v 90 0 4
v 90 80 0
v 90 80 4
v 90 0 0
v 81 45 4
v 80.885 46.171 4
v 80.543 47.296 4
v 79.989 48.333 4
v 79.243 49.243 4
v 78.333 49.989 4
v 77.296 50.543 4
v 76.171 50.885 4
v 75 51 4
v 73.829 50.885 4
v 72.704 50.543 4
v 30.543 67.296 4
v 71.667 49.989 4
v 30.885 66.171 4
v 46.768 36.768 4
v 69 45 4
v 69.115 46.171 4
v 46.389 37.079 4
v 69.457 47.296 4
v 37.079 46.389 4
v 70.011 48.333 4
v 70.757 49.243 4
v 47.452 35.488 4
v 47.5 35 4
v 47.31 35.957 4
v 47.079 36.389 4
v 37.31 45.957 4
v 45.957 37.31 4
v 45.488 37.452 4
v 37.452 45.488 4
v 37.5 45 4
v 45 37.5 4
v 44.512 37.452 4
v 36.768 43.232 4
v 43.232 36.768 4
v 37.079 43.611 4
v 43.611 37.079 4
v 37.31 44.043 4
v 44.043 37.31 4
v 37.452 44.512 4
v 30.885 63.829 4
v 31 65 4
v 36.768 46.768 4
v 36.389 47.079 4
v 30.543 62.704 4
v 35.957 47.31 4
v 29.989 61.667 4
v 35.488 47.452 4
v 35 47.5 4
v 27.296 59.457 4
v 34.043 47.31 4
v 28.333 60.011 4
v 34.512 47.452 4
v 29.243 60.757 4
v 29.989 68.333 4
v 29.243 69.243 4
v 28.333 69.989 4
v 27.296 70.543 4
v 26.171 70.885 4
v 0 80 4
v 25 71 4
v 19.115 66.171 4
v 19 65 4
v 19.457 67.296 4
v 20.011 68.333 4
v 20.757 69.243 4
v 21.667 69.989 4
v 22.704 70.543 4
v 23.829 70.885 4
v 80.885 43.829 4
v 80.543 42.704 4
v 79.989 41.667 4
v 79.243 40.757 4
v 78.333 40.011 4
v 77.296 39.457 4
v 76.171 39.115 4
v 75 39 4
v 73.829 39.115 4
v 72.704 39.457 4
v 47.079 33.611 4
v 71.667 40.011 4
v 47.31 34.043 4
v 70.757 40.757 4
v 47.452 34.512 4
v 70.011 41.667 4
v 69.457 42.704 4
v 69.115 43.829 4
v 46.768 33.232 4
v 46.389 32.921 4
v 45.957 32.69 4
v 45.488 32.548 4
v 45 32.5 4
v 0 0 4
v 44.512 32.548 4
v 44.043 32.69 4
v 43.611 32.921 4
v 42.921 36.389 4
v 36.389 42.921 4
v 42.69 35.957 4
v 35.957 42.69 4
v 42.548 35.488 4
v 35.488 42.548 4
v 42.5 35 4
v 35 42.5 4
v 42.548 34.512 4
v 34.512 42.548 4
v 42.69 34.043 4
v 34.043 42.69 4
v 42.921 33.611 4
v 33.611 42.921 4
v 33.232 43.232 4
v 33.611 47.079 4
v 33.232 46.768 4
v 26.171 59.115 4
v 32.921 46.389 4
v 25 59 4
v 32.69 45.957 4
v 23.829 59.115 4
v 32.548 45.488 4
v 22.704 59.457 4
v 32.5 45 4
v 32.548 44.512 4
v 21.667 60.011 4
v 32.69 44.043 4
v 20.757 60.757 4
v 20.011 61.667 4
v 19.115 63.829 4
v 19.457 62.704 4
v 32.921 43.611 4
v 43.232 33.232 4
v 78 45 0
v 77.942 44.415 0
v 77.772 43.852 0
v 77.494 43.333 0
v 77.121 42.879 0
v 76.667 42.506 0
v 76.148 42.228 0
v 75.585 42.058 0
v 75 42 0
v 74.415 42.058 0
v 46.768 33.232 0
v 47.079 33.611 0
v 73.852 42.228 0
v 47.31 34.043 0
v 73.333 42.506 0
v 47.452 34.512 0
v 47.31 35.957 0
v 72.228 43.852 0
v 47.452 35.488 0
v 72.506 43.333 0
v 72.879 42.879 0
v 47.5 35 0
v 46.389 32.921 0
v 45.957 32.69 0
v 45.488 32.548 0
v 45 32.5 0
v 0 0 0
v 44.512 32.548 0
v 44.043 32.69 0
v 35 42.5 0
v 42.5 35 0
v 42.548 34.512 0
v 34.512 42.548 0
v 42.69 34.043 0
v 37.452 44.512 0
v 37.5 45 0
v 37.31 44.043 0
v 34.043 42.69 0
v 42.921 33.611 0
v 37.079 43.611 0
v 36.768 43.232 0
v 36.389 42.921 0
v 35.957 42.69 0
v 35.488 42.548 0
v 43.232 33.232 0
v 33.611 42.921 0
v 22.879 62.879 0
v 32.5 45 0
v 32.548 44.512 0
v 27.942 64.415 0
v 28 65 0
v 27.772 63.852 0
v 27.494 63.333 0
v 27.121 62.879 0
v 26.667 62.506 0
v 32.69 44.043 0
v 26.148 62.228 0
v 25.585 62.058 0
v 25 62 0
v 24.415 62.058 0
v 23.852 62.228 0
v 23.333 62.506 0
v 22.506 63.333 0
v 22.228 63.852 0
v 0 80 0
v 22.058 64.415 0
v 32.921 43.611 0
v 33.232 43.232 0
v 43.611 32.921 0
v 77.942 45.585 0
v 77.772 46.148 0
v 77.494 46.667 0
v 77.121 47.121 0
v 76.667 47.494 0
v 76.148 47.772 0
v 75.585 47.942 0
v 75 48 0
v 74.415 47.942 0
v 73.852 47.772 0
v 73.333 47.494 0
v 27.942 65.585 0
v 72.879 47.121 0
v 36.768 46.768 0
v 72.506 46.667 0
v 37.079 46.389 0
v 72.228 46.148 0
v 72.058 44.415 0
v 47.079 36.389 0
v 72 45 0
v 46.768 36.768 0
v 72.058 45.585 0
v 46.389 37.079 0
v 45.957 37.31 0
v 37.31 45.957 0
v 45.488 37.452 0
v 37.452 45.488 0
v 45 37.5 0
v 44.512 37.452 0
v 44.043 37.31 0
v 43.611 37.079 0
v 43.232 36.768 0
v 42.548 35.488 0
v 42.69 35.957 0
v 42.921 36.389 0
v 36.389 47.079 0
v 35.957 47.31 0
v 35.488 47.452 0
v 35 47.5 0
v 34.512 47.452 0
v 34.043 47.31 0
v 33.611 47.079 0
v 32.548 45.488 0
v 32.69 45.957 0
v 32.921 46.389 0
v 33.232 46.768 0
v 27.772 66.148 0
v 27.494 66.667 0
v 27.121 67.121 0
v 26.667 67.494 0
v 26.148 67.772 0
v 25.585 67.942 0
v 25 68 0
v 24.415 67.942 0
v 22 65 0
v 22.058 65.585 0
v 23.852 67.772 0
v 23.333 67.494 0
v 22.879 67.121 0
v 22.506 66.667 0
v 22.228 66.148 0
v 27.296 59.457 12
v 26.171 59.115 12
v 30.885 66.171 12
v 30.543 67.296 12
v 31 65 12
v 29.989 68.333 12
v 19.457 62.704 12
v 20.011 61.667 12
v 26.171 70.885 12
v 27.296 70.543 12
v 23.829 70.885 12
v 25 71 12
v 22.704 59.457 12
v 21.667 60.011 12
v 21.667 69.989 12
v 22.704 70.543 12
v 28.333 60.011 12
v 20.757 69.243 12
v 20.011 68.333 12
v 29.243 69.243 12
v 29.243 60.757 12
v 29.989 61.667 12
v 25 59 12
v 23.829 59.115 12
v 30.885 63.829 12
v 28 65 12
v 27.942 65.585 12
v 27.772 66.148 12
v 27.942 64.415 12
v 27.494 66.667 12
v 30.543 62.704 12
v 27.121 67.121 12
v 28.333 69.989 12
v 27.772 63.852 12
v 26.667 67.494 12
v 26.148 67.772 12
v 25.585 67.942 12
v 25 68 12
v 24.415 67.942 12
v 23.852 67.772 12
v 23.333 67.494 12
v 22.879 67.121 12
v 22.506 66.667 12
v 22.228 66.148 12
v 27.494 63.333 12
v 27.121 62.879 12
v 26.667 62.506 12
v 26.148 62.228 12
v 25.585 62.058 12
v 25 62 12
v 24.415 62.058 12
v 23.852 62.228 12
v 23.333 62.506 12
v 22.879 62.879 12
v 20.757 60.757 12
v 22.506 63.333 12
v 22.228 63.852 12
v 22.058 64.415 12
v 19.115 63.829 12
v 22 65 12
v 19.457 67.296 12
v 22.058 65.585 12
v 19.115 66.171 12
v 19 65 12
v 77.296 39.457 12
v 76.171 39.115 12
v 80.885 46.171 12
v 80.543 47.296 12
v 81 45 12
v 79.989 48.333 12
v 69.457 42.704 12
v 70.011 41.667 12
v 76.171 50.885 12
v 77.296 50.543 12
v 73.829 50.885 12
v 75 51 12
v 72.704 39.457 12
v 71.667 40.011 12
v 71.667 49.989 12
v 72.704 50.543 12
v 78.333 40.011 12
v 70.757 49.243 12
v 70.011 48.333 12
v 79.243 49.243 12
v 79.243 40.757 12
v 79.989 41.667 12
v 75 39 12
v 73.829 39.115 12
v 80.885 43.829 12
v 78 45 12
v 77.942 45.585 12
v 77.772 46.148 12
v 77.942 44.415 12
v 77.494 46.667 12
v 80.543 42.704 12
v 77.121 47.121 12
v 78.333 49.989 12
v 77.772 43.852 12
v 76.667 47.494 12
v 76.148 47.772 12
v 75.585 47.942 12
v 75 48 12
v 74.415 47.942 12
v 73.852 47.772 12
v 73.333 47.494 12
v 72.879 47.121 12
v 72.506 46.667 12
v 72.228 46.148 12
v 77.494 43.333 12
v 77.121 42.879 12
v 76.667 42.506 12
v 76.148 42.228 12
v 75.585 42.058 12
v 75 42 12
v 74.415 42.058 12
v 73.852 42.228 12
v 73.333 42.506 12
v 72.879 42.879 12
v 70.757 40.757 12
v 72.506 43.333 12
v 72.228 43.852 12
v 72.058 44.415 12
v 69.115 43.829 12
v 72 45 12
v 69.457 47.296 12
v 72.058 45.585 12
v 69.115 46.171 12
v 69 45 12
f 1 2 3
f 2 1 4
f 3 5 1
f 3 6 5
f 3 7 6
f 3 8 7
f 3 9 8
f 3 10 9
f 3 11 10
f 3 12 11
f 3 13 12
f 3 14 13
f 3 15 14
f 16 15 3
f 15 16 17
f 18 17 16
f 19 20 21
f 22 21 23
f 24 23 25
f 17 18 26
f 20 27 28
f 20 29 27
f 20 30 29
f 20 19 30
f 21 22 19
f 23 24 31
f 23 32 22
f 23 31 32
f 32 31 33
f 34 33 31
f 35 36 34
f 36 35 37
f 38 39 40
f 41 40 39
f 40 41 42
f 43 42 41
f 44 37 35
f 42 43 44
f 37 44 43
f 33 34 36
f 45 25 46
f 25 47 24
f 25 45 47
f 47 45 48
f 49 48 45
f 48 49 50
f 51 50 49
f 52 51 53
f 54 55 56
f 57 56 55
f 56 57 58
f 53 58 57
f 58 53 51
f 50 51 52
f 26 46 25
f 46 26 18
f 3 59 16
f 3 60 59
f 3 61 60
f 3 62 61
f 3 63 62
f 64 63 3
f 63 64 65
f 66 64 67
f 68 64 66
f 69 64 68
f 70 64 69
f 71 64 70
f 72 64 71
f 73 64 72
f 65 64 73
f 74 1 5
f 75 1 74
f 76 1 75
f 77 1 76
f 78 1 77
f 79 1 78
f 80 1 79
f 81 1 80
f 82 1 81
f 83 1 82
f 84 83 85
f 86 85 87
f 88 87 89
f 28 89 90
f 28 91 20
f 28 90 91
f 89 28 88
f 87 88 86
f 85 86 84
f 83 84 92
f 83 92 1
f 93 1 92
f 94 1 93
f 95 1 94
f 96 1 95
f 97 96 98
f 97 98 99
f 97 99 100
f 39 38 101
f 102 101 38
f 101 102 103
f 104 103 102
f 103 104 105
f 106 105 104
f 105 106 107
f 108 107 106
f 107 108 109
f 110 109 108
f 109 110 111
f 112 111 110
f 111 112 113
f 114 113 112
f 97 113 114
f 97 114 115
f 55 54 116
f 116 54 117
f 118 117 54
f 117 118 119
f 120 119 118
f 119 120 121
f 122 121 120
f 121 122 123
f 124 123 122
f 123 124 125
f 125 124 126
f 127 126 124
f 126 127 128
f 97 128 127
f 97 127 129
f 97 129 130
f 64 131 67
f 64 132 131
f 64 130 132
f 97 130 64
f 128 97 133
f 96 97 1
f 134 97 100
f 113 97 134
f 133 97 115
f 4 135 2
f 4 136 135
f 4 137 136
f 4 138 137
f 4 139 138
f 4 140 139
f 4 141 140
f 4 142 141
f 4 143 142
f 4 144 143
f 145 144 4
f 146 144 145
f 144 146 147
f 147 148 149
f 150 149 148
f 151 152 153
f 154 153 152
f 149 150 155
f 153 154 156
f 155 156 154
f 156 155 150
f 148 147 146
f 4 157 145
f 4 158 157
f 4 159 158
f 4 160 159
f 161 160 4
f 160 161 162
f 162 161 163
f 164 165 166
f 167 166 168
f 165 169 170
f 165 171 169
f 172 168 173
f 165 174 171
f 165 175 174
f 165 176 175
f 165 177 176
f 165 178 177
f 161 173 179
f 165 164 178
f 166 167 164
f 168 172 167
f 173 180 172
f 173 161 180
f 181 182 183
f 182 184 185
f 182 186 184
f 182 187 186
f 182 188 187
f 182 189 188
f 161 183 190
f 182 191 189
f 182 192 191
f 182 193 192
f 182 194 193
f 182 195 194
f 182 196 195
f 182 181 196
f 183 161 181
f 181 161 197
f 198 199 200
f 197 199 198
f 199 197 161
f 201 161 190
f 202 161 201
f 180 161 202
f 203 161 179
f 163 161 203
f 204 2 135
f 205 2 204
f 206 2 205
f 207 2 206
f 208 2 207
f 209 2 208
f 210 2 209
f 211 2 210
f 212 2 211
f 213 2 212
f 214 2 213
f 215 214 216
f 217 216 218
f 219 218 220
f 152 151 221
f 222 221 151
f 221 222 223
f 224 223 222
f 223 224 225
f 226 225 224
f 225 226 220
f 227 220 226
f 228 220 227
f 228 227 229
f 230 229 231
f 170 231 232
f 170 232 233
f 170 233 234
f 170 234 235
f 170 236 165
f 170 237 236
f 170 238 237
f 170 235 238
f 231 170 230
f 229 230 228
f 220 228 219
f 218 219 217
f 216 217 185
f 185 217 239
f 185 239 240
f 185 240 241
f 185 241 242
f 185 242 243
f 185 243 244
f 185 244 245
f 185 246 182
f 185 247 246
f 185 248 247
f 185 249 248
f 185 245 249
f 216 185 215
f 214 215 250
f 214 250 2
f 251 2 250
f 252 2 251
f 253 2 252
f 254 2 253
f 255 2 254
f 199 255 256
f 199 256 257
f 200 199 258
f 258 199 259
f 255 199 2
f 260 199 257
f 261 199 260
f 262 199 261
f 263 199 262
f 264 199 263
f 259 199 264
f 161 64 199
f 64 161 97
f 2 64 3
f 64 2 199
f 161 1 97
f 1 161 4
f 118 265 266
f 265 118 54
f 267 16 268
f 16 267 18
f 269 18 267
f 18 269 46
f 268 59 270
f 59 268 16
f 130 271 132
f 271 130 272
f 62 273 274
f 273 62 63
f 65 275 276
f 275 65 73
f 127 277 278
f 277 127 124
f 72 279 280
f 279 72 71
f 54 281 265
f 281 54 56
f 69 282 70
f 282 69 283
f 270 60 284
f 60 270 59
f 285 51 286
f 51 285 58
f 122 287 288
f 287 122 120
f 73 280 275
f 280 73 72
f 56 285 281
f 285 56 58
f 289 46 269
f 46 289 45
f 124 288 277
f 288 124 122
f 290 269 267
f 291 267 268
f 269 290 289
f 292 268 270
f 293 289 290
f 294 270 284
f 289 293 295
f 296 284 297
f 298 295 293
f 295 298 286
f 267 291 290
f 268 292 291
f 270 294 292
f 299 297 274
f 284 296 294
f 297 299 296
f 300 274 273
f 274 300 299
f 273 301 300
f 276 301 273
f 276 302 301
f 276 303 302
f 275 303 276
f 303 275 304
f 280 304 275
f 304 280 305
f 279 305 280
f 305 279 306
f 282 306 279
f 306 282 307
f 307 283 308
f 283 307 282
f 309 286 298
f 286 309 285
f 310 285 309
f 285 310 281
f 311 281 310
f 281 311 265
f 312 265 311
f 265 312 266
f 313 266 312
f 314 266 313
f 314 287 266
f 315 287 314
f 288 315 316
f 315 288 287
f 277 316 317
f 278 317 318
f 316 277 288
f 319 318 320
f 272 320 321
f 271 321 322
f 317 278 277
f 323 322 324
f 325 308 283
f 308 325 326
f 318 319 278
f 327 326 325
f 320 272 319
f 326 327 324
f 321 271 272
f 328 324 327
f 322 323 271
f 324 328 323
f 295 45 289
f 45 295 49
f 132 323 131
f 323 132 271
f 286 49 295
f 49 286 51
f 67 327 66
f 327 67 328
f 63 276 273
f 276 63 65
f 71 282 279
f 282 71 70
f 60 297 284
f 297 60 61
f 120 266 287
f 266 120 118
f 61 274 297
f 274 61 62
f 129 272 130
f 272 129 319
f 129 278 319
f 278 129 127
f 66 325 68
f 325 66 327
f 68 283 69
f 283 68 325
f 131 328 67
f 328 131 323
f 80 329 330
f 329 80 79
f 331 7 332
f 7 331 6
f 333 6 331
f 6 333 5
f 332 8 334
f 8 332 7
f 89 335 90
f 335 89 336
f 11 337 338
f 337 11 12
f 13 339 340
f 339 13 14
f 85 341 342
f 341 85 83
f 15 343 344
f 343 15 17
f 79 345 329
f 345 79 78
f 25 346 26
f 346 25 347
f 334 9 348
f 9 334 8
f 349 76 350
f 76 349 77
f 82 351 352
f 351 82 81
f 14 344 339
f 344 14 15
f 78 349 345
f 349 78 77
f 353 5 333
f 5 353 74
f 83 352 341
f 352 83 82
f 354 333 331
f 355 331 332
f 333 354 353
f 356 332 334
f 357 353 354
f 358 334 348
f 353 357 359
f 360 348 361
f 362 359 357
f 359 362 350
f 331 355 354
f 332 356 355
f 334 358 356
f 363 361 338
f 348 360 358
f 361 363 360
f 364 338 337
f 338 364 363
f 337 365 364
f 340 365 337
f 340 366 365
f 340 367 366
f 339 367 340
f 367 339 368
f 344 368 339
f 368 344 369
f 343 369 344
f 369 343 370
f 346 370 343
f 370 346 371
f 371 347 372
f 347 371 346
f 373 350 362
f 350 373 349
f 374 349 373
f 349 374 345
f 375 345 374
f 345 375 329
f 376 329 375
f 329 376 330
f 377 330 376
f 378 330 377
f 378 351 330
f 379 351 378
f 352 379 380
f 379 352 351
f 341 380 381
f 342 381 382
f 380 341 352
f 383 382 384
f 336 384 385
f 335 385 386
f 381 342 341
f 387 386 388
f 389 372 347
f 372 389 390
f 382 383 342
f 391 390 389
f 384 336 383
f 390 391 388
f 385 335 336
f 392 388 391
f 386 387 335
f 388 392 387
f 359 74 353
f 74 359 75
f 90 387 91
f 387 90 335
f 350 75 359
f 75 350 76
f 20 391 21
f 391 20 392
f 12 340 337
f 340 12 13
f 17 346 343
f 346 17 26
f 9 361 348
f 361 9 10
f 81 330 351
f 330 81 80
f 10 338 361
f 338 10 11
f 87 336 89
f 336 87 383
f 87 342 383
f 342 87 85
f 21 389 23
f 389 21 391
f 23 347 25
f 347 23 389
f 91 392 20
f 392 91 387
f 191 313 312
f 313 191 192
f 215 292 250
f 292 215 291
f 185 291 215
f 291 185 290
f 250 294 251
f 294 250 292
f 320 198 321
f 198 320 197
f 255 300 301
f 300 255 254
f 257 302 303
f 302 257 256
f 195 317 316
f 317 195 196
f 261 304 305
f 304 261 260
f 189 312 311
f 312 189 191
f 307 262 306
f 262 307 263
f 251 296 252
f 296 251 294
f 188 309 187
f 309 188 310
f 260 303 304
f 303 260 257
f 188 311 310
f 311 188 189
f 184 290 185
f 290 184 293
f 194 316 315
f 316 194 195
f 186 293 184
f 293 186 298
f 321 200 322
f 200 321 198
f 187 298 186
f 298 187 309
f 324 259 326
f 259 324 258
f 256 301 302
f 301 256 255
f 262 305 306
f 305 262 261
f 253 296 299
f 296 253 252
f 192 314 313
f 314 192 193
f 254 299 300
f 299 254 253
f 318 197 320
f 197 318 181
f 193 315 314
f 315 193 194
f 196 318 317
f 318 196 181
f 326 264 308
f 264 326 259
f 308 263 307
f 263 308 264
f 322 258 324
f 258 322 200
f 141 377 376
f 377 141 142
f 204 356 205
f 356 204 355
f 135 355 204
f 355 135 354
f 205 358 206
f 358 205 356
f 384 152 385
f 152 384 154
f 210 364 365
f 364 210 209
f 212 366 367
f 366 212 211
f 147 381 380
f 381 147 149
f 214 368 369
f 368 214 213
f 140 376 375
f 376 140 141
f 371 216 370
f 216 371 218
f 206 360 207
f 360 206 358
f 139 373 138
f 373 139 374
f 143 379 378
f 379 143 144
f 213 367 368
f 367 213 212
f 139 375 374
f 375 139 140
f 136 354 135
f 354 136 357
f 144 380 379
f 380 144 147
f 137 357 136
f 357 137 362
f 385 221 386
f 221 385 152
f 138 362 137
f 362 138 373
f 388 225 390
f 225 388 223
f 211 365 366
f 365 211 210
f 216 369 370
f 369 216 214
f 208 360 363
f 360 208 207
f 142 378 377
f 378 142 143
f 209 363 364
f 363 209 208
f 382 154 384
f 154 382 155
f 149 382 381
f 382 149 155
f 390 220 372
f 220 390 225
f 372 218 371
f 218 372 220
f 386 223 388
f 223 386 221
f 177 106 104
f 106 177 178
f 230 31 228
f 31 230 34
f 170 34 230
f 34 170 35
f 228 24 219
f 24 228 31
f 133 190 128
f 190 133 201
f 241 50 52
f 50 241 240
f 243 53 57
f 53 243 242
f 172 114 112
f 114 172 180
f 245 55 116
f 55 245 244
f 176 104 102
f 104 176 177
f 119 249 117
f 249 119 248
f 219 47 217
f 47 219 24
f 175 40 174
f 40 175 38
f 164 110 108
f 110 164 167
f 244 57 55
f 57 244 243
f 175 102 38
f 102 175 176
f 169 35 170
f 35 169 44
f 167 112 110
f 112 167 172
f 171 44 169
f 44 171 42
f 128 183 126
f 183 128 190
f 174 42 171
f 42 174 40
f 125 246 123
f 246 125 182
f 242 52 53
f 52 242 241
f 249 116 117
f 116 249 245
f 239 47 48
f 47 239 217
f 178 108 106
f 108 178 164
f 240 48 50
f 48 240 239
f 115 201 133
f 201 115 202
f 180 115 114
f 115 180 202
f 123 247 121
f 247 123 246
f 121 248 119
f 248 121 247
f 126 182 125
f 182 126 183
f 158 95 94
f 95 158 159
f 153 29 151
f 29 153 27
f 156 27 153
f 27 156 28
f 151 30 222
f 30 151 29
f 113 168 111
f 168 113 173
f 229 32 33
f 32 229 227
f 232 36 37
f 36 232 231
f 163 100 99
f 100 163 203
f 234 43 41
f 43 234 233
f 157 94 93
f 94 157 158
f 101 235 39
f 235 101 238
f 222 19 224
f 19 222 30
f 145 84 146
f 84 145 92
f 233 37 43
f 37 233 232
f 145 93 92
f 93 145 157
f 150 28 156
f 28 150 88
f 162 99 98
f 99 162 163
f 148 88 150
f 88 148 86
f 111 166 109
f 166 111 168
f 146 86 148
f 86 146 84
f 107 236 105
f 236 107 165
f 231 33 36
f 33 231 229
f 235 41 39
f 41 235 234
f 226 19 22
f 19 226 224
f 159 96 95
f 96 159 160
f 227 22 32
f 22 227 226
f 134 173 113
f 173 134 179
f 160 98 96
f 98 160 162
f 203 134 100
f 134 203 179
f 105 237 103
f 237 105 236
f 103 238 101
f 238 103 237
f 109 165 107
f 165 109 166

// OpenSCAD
$fn = 32;

// ----------------------------------------------------------------------
// Mixed field: bosses and holes at given coordinates
// ----------------------------------------------------------------------

// --- parameters (mm) ---
plate_l = 90;             // plate length, X
plate_w = 80;             // plate width, Y
plate_t = 4;              // plate thickness, Z
boss_d = 12;              // boss diameter
boss_h = 8;               // boss height above the plate
hole_d = 5;               // through hole diameter

total_h = plate_t + boss_h;  // overall height

difference() {
  union() {
    cube([plate_l, plate_w, plate_t]);
    translate([25, 65, plate_t]) cylinder(h = boss_h, d = boss_d);
    translate([75, 45, plate_t]) cylinder(h = boss_h, d = boss_d);
  }
  translate([25, 65, -1]) cylinder(h = total_h + 2, d = boss_d / 2);
  translate([75, 45, -1]) cylinder(h = total_h + 2, d = boss_d / 2);
  translate([35, 45, -1]) cylinder(h = plate_t + 2, d = hole_d);
  translate([45, 35, -1]) cylinder(h = plate_t + 2, d = hole_d);
}
